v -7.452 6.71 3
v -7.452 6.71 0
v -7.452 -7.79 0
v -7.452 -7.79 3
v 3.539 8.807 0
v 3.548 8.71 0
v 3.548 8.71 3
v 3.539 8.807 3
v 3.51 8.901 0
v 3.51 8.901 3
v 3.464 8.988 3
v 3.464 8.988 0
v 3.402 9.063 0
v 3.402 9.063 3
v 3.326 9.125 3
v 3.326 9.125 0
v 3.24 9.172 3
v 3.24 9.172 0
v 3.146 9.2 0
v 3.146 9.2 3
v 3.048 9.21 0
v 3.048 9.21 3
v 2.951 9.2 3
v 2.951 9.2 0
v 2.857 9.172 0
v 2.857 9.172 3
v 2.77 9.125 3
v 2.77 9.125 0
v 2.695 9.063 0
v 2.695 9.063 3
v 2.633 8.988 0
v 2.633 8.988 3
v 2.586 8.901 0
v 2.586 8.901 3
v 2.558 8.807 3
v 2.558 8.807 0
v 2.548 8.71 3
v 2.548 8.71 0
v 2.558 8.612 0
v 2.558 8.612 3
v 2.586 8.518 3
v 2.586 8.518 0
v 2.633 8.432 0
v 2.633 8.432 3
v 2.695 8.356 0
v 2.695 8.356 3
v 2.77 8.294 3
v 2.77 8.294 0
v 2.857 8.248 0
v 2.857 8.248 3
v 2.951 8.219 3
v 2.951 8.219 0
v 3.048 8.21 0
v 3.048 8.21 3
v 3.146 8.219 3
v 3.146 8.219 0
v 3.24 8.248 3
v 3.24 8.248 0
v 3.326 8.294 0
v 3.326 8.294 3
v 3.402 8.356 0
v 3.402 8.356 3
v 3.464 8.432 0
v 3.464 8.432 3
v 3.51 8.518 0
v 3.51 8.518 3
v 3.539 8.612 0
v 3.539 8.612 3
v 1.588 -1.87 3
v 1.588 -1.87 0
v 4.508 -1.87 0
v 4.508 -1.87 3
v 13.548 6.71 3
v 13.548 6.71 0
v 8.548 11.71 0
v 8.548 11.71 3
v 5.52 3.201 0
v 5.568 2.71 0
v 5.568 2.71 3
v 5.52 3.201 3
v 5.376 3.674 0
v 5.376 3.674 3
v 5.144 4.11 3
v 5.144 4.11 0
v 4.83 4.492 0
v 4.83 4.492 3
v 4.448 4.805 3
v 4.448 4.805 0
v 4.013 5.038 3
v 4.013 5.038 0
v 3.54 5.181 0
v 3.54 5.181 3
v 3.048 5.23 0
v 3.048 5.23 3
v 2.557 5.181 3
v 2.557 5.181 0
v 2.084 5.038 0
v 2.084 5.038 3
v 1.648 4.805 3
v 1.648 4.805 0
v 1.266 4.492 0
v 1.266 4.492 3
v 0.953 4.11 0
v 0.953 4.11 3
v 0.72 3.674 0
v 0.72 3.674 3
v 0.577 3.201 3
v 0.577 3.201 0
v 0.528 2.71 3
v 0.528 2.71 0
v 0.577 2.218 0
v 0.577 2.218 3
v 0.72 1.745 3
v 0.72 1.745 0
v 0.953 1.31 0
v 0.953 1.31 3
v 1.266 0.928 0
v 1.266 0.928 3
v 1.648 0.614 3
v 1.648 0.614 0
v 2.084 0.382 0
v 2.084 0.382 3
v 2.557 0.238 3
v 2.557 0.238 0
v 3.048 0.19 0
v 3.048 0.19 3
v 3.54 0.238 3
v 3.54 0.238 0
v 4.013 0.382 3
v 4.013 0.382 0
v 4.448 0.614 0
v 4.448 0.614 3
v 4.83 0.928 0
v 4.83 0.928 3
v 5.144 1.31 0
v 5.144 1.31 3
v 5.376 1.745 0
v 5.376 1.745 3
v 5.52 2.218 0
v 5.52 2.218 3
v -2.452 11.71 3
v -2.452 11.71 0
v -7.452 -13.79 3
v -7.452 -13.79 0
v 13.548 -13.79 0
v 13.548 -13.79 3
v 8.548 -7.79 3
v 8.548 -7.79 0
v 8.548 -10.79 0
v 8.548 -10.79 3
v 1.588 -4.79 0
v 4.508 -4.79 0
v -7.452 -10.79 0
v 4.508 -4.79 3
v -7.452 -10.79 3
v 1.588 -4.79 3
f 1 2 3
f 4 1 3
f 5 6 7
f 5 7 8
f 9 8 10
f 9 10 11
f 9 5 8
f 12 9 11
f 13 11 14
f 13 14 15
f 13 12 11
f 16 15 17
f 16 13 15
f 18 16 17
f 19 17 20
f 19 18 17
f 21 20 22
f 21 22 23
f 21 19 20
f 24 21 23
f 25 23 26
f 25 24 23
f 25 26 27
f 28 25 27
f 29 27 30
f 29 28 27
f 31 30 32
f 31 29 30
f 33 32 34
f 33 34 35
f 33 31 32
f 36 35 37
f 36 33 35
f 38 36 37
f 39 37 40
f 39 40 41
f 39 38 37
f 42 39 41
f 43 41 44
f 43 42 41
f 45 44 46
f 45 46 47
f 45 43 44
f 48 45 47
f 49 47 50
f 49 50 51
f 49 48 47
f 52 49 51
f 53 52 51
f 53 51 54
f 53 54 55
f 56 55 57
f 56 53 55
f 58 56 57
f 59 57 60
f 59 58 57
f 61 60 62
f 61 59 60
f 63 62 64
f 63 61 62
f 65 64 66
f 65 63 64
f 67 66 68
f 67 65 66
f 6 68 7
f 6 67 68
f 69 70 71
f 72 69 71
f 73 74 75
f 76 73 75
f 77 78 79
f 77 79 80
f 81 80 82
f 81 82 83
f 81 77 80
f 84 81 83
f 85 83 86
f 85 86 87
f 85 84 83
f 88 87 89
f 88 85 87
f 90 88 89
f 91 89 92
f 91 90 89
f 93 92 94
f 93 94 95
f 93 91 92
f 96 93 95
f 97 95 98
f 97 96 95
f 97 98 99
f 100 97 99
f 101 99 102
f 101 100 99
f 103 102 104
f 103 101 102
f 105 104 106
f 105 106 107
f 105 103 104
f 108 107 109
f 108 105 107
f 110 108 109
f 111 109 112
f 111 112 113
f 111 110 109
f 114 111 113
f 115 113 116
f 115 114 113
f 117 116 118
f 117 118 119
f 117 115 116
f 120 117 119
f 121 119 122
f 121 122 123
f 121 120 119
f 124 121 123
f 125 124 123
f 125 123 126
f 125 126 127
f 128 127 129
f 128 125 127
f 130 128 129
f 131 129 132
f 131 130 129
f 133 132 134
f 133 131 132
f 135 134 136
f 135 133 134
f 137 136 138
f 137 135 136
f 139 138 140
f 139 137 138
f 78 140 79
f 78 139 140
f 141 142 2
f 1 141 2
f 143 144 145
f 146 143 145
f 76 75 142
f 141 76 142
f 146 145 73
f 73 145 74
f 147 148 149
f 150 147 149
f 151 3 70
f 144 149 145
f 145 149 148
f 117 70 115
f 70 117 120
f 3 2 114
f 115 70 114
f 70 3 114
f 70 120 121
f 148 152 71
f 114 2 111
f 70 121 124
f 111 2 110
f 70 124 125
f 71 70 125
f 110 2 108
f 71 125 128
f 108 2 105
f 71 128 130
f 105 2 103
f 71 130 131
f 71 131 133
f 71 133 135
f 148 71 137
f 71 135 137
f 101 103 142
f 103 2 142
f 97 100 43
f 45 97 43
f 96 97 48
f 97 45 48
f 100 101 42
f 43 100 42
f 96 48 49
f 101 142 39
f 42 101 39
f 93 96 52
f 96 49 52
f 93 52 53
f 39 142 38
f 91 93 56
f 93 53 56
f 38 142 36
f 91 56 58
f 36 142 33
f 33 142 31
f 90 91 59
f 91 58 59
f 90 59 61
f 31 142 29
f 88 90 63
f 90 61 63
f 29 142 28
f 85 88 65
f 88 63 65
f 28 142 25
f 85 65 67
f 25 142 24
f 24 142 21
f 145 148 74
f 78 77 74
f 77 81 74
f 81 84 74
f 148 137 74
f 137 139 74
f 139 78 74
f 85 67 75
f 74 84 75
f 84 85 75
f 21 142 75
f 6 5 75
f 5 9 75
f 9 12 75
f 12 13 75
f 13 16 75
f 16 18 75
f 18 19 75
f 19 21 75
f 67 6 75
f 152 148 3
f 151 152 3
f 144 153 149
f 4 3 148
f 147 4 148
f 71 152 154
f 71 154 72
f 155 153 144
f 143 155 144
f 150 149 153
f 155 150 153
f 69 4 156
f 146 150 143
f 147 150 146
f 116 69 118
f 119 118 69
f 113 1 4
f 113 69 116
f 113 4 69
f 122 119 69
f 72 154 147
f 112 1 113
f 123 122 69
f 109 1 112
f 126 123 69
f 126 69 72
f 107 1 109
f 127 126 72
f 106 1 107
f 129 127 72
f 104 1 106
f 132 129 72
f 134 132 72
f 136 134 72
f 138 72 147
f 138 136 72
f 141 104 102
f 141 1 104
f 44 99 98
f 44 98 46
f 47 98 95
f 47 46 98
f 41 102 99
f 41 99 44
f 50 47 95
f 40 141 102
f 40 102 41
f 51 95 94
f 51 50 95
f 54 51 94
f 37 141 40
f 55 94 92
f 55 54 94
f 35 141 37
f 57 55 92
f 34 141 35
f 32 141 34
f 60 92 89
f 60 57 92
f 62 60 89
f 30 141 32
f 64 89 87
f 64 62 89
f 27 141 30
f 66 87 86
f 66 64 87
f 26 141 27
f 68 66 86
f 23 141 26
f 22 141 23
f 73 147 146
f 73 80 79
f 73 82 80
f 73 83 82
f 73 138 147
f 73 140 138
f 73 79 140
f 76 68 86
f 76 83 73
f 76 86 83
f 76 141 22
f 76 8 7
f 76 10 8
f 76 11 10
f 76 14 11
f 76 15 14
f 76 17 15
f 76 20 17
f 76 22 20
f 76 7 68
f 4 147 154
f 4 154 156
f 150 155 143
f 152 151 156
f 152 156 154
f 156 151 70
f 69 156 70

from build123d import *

# Parameters (mm, degrees)
SKETCH1_W           = 2.92
SKETCH1_H           = 2.92
SKETCH1_R           = 2.52
SKETCH1_R_2         = 0.5
BOSS_EXTRUDE1_DEPTH = 3


with BuildPart() as part:
    # Sketch1 → Boss-Extrude1 (new body)
    with BuildSketch(Plane.XY):
        Polygon((13.5482559, 6.709731544), (8.5482559, 11.709731544), (-2.4517441, 11.709731544), (-7.4517441, 6.709731544), (-7.4517441, -7.790268456), (8.5482559, -7.790268456), (8.5482559, -10.790268456), (-7.4517441, -10.790268456), (-7.4517441, -13.790268456), (13.5482559, -13.790268456), align=None)
        with Locations((3.0482559, -3.330268456)):
            Rectangle(SKETCH1_W, SKETCH1_H, mode=Mode.SUBTRACT)
        with Locations((3.0482559, 2.709731544)):
            Circle(SKETCH1_R, mode=Mode.SUBTRACT)
        with Locations((3.0482559, 8.709731544)):
            Circle(SKETCH1_R_2, mode=Mode.SUBTRACT)
    extrude(amount=BOSS_EXTRUDE1_DEPTH)


solid = part.part
